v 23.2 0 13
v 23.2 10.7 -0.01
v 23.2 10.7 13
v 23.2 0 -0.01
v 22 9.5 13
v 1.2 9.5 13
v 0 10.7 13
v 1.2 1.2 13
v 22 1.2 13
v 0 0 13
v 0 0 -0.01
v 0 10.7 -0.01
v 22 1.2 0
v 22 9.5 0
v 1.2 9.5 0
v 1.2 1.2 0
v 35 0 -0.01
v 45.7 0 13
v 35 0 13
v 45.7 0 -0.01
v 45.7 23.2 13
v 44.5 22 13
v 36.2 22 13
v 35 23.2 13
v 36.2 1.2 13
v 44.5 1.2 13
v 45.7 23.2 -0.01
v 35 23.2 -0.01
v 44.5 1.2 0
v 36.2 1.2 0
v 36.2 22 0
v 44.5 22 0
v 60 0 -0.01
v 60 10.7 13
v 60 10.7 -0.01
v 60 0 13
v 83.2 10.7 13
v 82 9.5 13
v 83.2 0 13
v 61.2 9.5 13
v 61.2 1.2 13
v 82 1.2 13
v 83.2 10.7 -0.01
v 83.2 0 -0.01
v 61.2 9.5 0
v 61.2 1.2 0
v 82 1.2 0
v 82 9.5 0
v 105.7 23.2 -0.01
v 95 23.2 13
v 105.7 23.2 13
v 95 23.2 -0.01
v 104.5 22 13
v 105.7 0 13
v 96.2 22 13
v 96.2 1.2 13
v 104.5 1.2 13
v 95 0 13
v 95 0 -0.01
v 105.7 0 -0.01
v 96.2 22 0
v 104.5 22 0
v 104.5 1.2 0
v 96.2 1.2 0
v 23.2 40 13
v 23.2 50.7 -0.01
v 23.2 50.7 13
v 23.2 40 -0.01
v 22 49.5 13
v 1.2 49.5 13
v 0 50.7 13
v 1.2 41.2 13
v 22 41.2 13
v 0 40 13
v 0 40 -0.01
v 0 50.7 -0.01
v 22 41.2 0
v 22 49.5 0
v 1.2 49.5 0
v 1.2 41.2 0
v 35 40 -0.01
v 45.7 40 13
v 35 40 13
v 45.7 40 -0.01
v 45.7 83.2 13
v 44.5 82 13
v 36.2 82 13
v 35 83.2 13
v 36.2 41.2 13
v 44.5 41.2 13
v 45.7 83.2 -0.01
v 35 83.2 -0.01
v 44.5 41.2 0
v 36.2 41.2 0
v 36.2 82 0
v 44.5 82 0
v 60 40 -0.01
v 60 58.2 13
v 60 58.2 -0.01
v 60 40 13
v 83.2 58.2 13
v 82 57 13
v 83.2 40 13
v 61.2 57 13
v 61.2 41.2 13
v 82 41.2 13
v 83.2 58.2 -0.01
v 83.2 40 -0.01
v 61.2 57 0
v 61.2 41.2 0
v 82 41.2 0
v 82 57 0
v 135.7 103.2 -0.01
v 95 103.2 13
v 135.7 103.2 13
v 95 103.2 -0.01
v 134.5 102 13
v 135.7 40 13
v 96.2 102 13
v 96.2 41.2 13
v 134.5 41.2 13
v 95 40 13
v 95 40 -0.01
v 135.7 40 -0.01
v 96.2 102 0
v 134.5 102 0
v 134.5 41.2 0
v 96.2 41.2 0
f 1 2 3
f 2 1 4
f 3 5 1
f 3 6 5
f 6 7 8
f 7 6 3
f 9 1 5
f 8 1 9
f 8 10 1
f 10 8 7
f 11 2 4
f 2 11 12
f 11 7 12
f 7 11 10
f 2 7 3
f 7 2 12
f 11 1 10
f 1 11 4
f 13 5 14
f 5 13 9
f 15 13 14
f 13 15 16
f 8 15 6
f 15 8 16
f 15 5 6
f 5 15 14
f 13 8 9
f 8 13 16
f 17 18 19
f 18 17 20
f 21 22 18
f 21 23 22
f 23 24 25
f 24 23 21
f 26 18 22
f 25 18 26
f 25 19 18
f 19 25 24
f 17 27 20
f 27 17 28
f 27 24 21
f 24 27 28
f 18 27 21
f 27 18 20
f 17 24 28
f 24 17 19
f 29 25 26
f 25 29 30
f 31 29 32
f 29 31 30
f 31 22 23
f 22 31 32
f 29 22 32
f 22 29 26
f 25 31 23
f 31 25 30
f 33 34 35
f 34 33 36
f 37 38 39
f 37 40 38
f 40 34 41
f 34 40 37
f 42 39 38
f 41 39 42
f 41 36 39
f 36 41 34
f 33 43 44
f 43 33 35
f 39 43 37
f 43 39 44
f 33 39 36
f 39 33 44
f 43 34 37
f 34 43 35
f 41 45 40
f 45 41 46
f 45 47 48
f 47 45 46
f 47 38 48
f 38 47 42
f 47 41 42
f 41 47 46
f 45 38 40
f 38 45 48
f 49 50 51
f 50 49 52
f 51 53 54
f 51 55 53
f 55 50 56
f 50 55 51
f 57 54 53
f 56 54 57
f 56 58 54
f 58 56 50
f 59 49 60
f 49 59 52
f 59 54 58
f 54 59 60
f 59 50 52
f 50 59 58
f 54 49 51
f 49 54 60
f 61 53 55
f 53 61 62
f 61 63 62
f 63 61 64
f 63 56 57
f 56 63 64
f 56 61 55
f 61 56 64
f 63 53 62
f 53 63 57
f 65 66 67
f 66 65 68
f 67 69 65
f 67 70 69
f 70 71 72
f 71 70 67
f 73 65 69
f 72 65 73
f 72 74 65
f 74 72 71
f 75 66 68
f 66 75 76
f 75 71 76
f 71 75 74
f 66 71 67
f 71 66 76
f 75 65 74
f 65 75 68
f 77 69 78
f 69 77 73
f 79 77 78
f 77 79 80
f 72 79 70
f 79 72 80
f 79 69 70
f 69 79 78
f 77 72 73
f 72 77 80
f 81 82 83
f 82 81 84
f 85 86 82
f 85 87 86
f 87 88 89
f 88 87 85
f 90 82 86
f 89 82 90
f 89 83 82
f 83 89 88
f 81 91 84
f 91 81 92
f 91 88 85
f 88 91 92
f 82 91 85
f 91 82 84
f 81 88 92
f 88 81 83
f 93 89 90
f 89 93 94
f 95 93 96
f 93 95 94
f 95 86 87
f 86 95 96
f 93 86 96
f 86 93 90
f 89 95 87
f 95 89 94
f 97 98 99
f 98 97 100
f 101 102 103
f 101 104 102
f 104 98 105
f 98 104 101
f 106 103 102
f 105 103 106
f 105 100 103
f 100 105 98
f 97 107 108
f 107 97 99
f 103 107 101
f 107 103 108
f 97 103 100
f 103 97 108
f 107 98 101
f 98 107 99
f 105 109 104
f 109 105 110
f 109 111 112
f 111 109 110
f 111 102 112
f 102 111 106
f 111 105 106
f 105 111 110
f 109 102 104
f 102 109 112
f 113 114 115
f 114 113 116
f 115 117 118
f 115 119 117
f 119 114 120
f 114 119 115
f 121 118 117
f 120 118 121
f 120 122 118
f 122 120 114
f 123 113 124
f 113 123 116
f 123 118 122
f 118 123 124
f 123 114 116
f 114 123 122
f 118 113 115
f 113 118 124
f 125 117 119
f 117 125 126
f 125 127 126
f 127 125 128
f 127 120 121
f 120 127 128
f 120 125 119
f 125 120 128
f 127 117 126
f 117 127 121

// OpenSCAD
// file: ../../Base/Boxes.scad
// Fischertechnik Box Foundation
// Pre-designed Boxes

use <Constants.scad>

include <PlacementOptions.scad>

box190Width = 190;
box190Depth = 130;
box130Width = 130;
box130Depth = 95;
boxUsageHeight = 33.9;
boxWallThickness = 2.4;
boxBaseThickness = 1.0;

// getBoxWallThickness()
// Gets the wall thickness of a Fischertechnik Box

function getBoxWallThickness() = boxWallThickness;

// Gets the usable height of a fischertechnik box
function getBoxUsageHeight() = boxUsageHeight;

// Gets the thickness of the Fischertechnik box base.
function getBoxBaseThickness() = boxBaseThickness;

// Gets the usable inner space of a Box 190 as an x/y-list
function getBox190Space() = [
    box190Width - 2*getBoxWallThickness(), 
    box190Depth - 2*getBoxWallThickness() ];

// Imports the Fischertechnik empty box 130x190 mm and places it at position 0,0
// 190x130 are the outer sizes, the inner space is slightly smaller. Use getBox190Space() to get the inner sizes.
// This module needs the STL file "Fischertechnik Box 130x190.stl" in the library path.
// The box is positioned that the usable inner space is at the 0,0,0 position. The

module Box190() {
    translate([-getBoxWallThickness(),-getBoxWallThickness(),-getBoxBaseThickness()])
        import("Fischertechnik Box 130x190.stl", convexity=3);
}

// Gets the usable inner space of a Box 130 as an x/y-list
function getBox130Space() = [
    box130Width - 2*getBoxWallThickness(), 
    box130Depth - 2*getBoxWallThickness() ];

// Imports the Fischertechnik empty box 95x130 mm and places it at position 0,0
// 190x130 are the outer sizes, the inner space is slightly smaller. Use getBox190Space() to get the inner sizes.
// This module needs the STL file "Fischertechnik Box 95x130.stl" in the library path.
// The box is positioned that the usable inner space is at the 0,0,0 position. The

module Box130() {
    translate([-getBoxWallThickness(),-getBoxWallThickness(),-getBoxBaseThickness()])
        import("Fischertechnik Box 95x130.stl", convexity=3);
}

// Creates a web at the specified box walls
// corner 0 = LowerLeft, 1 = UpperLeft, 2 = UpperRight, 3 = LowerRight
// side 0 = LeftOfCorner, 1 = RightOfCorner
// distance = Distance in mm from the corner
// box = inner width and depth of the box (default: Box 190)
// webWidth = length of the web (default is 3 mms)
// webThickness = thickness of the web (default is 1 mm)

module BoxWeb(corner, side, distance, box=getBox190Space(), webWidth=3, webThickness=1.0) {
    sink = getBoxWallThickness()/2;

    width = (corner % 2 == 0) ? 
            (side == LeftOfCorner ? webWidth : webThickness) :
            (side == LeftOfCorner ? webThickness : webWidth);

    depth = (corner % 2 == 0) ? 
            (side == RightOfCorner ? webWidth : webThickness) :
            (side == RightOfCorner ? webThickness : webWidth);
    
    xDiff = corner == LowerLeft ? 
                (side == LeftOfCorner ? -sink : distance) :
            (corner == UpperLeft ?                
                (side == LeftOfCorner ? distance : -sink) :
            (corner == UpperRight ?
                (side == LeftOfCorner ? box.x-webWidth+sink : box.x-distance-webThickness) :
                (side == LeftOfCorner ? box.x-distance-webThickness: box.x-webWidth+sink)));

    yDiff = corner == LowerLeft ? 
                (side == RightOfCorner ? -sink : distance) :
            (corner == UpperLeft ?
                (side == RightOfCorner ? box.y-distance : box.y-webWidth+sink) :
            (corner == UpperRight ?
                (side == RightOfCorner ? box.y-webWidth+sink : box.y-distance) :
                (side == RightOfCorner ? distance : -sink)));
    
    translate([xDiff, yDiff, -getExcess()])
        cube([width, depth, boxUsageHeight + 2*getExcess()]);
}
// file: ../../Base/Rotation.scad
// Fischertechnik Box Foundation
// Geometry Helpers Rotation

include <PlacementOptions.scad>

// getRotatedSpace(space, rotation=NoRotation)
// Rotates the space dependent on the specified rotation

function getRotatedSpace(space, rotation=NoRotation) = [
    (rotation == Rotate90 || rotation == Rotate270) ? space.y : space.x,
    (rotation == Rotate90 || rotation == Rotate270) ? space.x : space.y
];

// Rotates the given space around the fixed left lower corner
// space = the space the children needs as width/depth list [width,depth]
// rotation = 0 Rotate0 degrees, 1 Rotate90 degrees, 2 Rotate180 degrees, 3 Rotate270 degrees (equivalent to -90)

module RotateFix(space, rotation=Rotate0) {
    dy = (rotation == Rotate0 || rotation == Rotate270) ? 0 :
        (rotation == Rotate90) ? space.x :
        space.y;
    dx = (rotation < Rotate180) ? 0 :
        (rotation == Rotate180) ? space.x :
        space.y;
    
    translate([dx, dy, 0])
        rotate([0, 0, rotations[rotation]])
            children();
}
// file: ../../Base/Alignment.scad
// Fischertechnik Box Foundation
// Geometry Helpers Alignment

include <PlacementOptions.scad>

// getAlignedX(elementWidth, spaceWidth, align=AlignRight, offset=0)
// Gets the aligned X offset of an element with the given
// width in the given space.
// elementWidth = The width of the element to positon
// spaceWidth = The space where the element should be aligned
// align = 0 AlignLeft, 1 AlignCenter, 2 AlignRight
// offset = an optional offset from the aligned position. When
// aligned left or centered, then positive values are in X direction.
// When aligned right then positive values are in negative X direction.

function getAlignedX(elementWidth, spaceWidth, align=AlignRight, offset=0) =
    (align == AlignLeft) ?
        offset :
        ((align == AlignCenter) ?
        (spaceWidth - elementWidth)/2 + offset :
        spaceWidth - offset - elementWidth);

// getAlignedY(elementDepth, spaceDepth, align=AlignTop, offset=0)
// Gets the aligned Y offset of an element with the given
// depth in the given space.
// elementDepth = The depth of the element to positon
// spaceDepth = The space where the element should be aligned
// align = 0 AlignBottom, 1 AlignCenter, 2 AlignTop
// offset = an optional offset from the aligned position. When
// aligned bottom or centered, then positive values are in Y direction.
// When aligned top then positive values are in negative Y direction.

function getAlignedY(elementDepth, spaceDepth, align=AlignTop, offset=0) =
    (align == AlignBottom) ?
        offset :
        ((align == AlignCenter) ?
        (spaceDepth - elementDepth)/2 + offset :
        spaceDepth - offset - elementDepth);
// file: ../../Base/Constants.scad
// Fischertechnik Box Foundation
// Constants

// Constant values necessary for multiple elements

// Base constants
dividerThickness = 1.2;
excess = 0.01;
fragments = 90;
tolerance = 0.8;

// Gets the thickness of a divider 
function getDividerThickness() = dividerThickness;

// Gets the excess that is used to merge walls into each other
function getExcess() = excess;

// Gets amount of fragments of a cylinder
function getFragments() = fragments;

// Gets the inner tolerance of a frame to each side
function getTolerance() = tolerance;


// Fischertechnik specific constants
axisDiameter = 4;
axisBottomDiameter = axisDiameter + 1;
standardEdgeDistance = 2.5;
standardWebDistance = 11.5;
standardCornerLength = 15;
tubeWallFactor = 1.6;

// Gets axis diameter
function getAxisDiameter() = axisDiameter;

// Gets axis bottom diameter for thicker part at the bottom
function getAxisBottomDiameter() = axisBottomDiameter;

// gets the standard distance to the wall of the box for dockable frames with webs
function getStandardEdgeDistance() = standardEdgeDistance;

// gets the standard distance of each web to the corner of the dockable frame
function getStandardWebDistance() = standardWebDistance;

// gets the standard length of the corner walls of a dockable frame
function getStandardCornerLength() = standardCornerLength;

// gets the wall thickness of a tube.
function getTubeWallThickness() = tubeWallFactor * getDividerThickness();
// file: ../../Base/PlacementOptions.scad
// Fischertechnik Box Foundation
// Placement Options

// Alignment
NoAlign = 0;
AlignLeft = 1;
AlignBottom = 2;
AlignCenter = 3;
AlignRight = 4;
AlignTop = 5;

// Element rotation degree steps
rotations = [0, -90, -180, -270];

// Rotation
NoRotation = 0;
Rotate0 = 0;
Rotate90 = 1;
Rotate180 = 2;
Rotate270 = 3;

// Docking (seen from above)
NoDock = -1;
DockLeft = 0;
DockTop = 1;
DockRight = 2;
DockCorner = 2;
DockBottom = 3;

// Web corners
LowerLeft = 0;
UpperLeft = 1;
UpperRight = 2;
LowerRight = 3;

// Web position relative to corner
LeftOfCorner = 0;
RightOfCorner = 1;
// file: ../../Elements/FrameLockingRing.scad
// Fischertechnik Box Library
// Frame for Locking Ring
// 31020

use <../Base/Constants.scad>
use <../ModelBase/Simple.scad>

width = 20;
depth = 7.5;
height = 13;

// getFrameLockingRingSpace(columns=1, rows=1)
// columns = Count of locking rings in X direction (width of ring)
// rows = Count of locking rings in Y direction (depth of ring)
// Gets the space the frame locking ring needs as width (.x and .y as a list)

function getFrameLockingRingSpace(columns=1, rows=1) = getFrameOuterVolume([width*columns, depth*rows, height]);

// FrameLockingRing(columns, rows, smallSideIsX)
// columns = Count of locking rings in X direction (width of ring)
// rows = Count of locking rings in Y direction (depth of ring)
// The walls of the frame are 13 mm high. The small side is 7.5 mm wide, the large side
// is 20 mm wide.

module FrameLockingRing(columns=1, rows=1) {
    Frame([width*columns, depth*rows, height]);
}

// Tests
color("lightgray")
    FrameLockingRing(1);
// file: ../../Base/Placement.scad
// Fischertechnik Box Foundation
// Geometry Helpers Placement

use <Constants.scad>
use <Alignment.scad>
use <Rotation.scad>
use <Boxes.scad>

include <PlacementOptions.scad>

// Place(x=0, y=0, elementSpace=[0,0], alignX=AlignLeft, alignY=AlignBottom, rotation=Rotate0, boxSpace=getBox190Space())
// Places the child at the specified position
// y = Y-Position. This is a relative position when an X aligment is specified.
// x = X-Position. This is a relative position when an Y aligment is specified.
// elementSpace = space of the element to be placed [x,y]
// alignX = -1=NoAlign, 0 AlignLeft, 1 AlignCenter, 3 AlignRight (elementSpace and boxSpace required!)
// alignY = -1=NoAlign, 2 AlignBottom, 1 AlignCenter, 4 AlignTop (elementSpace and boxSpace required!)
// rotation = 0 Rotate0 0 degrees, 1 Rotate90 90 degrees, 
// 2 Rotate180 180 degrees, 3 Rotate270 270 degrees (equivalent to -90)
// boxSpace = Inner space of the box where the placement occurs [x,y] - default is Box 190x130 inner space

module Place(x=0, y=0, elementSpace=[0,0], 
  alignX=AlignLeft, alignY=AlignBottom, 
  rotation=NoRotation, boxSpace=getBox190Space()) {

    module Position(x, y, space, rotation=Rotate0) {
        translate([x, y, 0])
            RotateFix(space, rotation)
                children(0);
    }

    space = getRotatedSpace(elementSpace, rotation);
    alignedX = getAlignedX(space.x, boxSpace.x, alignX, x);
    alignedY = getAlignedY(space.y, boxSpace.y, alignY, y);
    Position(alignedX, alignedY, elementSpace, rotation)
        children(0);
}

// Center(space=getBox130Space(), elementSpace=[0,0])
// space = Space where the children is centered. For cylinder use centered=true and no elementSpace.
// elementSpace = space of the element to be centered [x,y]

module Center(space=getBox190Space(), elementSpace=[0,0]) {
    translate([(space.x - elementSpace.x) / 2, (space.y - elementSpace.y) / 2])
        children(0);
}

// CenterHorizontal(width=0, y=0, offset=0, space=getBox130Space())
// space = Space where the children is centered. For cylinder use centered=true and no elementSpace.
// elementSpace = space of the element to be centered [x,y]

module CenterHorizontal(width=0, y=0, offset=0, space=getBox190Space()) {
    translate([(space.x - width) / 2 + offset, y])
        children(0);
}

// CenterVertical(depth=0, x=0, offset=0, space=getBox130Space())
// space = Space where the children is centered. For cylinder use centered=true and no elementSpace.
// elementSpace = space of the element to be centered [x,y]

module CenterVerticalal(depth=0, x=0, offset=0, space=getBox190Space()) {
    translate([x, (space.y - depth) / 2 + offset])
        children(0);
}
// main file
// Fischertechnik Box Foundation
// Elements
// Test FrameLockingRing

use <../../Base/Placement.scad>
use <../../Elements/FrameLockingRing.scad>

include <../../Base/PlacementOptions.scad>

FrameLockingRing();

Place(35, 0, getFrameLockingRingSpace(), rotation=Rotate90)
    FrameLockingRing();

Place(60, 0, getFrameLockingRingSpace(), rotation=Rotate180)
    FrameLockingRing();

Place(95, 0, getFrameLockingRingSpace(), rotation=Rotate270)
    FrameLockingRing();

Place(0, 40)
FrameLockingRing();

Place(35, 40, getFrameLockingRingSpace(2), rotation=Rotate90)
    FrameLockingRing(2);

Place(60, 40, getFrameLockingRingSpace(rows=2), rotation=Rotate180)
    FrameLockingRing(rows=2);

Place(95, 40, getFrameLockingRingSpace(3, 5), rotation=Rotate270)
    FrameLockingRing(3, 5);
